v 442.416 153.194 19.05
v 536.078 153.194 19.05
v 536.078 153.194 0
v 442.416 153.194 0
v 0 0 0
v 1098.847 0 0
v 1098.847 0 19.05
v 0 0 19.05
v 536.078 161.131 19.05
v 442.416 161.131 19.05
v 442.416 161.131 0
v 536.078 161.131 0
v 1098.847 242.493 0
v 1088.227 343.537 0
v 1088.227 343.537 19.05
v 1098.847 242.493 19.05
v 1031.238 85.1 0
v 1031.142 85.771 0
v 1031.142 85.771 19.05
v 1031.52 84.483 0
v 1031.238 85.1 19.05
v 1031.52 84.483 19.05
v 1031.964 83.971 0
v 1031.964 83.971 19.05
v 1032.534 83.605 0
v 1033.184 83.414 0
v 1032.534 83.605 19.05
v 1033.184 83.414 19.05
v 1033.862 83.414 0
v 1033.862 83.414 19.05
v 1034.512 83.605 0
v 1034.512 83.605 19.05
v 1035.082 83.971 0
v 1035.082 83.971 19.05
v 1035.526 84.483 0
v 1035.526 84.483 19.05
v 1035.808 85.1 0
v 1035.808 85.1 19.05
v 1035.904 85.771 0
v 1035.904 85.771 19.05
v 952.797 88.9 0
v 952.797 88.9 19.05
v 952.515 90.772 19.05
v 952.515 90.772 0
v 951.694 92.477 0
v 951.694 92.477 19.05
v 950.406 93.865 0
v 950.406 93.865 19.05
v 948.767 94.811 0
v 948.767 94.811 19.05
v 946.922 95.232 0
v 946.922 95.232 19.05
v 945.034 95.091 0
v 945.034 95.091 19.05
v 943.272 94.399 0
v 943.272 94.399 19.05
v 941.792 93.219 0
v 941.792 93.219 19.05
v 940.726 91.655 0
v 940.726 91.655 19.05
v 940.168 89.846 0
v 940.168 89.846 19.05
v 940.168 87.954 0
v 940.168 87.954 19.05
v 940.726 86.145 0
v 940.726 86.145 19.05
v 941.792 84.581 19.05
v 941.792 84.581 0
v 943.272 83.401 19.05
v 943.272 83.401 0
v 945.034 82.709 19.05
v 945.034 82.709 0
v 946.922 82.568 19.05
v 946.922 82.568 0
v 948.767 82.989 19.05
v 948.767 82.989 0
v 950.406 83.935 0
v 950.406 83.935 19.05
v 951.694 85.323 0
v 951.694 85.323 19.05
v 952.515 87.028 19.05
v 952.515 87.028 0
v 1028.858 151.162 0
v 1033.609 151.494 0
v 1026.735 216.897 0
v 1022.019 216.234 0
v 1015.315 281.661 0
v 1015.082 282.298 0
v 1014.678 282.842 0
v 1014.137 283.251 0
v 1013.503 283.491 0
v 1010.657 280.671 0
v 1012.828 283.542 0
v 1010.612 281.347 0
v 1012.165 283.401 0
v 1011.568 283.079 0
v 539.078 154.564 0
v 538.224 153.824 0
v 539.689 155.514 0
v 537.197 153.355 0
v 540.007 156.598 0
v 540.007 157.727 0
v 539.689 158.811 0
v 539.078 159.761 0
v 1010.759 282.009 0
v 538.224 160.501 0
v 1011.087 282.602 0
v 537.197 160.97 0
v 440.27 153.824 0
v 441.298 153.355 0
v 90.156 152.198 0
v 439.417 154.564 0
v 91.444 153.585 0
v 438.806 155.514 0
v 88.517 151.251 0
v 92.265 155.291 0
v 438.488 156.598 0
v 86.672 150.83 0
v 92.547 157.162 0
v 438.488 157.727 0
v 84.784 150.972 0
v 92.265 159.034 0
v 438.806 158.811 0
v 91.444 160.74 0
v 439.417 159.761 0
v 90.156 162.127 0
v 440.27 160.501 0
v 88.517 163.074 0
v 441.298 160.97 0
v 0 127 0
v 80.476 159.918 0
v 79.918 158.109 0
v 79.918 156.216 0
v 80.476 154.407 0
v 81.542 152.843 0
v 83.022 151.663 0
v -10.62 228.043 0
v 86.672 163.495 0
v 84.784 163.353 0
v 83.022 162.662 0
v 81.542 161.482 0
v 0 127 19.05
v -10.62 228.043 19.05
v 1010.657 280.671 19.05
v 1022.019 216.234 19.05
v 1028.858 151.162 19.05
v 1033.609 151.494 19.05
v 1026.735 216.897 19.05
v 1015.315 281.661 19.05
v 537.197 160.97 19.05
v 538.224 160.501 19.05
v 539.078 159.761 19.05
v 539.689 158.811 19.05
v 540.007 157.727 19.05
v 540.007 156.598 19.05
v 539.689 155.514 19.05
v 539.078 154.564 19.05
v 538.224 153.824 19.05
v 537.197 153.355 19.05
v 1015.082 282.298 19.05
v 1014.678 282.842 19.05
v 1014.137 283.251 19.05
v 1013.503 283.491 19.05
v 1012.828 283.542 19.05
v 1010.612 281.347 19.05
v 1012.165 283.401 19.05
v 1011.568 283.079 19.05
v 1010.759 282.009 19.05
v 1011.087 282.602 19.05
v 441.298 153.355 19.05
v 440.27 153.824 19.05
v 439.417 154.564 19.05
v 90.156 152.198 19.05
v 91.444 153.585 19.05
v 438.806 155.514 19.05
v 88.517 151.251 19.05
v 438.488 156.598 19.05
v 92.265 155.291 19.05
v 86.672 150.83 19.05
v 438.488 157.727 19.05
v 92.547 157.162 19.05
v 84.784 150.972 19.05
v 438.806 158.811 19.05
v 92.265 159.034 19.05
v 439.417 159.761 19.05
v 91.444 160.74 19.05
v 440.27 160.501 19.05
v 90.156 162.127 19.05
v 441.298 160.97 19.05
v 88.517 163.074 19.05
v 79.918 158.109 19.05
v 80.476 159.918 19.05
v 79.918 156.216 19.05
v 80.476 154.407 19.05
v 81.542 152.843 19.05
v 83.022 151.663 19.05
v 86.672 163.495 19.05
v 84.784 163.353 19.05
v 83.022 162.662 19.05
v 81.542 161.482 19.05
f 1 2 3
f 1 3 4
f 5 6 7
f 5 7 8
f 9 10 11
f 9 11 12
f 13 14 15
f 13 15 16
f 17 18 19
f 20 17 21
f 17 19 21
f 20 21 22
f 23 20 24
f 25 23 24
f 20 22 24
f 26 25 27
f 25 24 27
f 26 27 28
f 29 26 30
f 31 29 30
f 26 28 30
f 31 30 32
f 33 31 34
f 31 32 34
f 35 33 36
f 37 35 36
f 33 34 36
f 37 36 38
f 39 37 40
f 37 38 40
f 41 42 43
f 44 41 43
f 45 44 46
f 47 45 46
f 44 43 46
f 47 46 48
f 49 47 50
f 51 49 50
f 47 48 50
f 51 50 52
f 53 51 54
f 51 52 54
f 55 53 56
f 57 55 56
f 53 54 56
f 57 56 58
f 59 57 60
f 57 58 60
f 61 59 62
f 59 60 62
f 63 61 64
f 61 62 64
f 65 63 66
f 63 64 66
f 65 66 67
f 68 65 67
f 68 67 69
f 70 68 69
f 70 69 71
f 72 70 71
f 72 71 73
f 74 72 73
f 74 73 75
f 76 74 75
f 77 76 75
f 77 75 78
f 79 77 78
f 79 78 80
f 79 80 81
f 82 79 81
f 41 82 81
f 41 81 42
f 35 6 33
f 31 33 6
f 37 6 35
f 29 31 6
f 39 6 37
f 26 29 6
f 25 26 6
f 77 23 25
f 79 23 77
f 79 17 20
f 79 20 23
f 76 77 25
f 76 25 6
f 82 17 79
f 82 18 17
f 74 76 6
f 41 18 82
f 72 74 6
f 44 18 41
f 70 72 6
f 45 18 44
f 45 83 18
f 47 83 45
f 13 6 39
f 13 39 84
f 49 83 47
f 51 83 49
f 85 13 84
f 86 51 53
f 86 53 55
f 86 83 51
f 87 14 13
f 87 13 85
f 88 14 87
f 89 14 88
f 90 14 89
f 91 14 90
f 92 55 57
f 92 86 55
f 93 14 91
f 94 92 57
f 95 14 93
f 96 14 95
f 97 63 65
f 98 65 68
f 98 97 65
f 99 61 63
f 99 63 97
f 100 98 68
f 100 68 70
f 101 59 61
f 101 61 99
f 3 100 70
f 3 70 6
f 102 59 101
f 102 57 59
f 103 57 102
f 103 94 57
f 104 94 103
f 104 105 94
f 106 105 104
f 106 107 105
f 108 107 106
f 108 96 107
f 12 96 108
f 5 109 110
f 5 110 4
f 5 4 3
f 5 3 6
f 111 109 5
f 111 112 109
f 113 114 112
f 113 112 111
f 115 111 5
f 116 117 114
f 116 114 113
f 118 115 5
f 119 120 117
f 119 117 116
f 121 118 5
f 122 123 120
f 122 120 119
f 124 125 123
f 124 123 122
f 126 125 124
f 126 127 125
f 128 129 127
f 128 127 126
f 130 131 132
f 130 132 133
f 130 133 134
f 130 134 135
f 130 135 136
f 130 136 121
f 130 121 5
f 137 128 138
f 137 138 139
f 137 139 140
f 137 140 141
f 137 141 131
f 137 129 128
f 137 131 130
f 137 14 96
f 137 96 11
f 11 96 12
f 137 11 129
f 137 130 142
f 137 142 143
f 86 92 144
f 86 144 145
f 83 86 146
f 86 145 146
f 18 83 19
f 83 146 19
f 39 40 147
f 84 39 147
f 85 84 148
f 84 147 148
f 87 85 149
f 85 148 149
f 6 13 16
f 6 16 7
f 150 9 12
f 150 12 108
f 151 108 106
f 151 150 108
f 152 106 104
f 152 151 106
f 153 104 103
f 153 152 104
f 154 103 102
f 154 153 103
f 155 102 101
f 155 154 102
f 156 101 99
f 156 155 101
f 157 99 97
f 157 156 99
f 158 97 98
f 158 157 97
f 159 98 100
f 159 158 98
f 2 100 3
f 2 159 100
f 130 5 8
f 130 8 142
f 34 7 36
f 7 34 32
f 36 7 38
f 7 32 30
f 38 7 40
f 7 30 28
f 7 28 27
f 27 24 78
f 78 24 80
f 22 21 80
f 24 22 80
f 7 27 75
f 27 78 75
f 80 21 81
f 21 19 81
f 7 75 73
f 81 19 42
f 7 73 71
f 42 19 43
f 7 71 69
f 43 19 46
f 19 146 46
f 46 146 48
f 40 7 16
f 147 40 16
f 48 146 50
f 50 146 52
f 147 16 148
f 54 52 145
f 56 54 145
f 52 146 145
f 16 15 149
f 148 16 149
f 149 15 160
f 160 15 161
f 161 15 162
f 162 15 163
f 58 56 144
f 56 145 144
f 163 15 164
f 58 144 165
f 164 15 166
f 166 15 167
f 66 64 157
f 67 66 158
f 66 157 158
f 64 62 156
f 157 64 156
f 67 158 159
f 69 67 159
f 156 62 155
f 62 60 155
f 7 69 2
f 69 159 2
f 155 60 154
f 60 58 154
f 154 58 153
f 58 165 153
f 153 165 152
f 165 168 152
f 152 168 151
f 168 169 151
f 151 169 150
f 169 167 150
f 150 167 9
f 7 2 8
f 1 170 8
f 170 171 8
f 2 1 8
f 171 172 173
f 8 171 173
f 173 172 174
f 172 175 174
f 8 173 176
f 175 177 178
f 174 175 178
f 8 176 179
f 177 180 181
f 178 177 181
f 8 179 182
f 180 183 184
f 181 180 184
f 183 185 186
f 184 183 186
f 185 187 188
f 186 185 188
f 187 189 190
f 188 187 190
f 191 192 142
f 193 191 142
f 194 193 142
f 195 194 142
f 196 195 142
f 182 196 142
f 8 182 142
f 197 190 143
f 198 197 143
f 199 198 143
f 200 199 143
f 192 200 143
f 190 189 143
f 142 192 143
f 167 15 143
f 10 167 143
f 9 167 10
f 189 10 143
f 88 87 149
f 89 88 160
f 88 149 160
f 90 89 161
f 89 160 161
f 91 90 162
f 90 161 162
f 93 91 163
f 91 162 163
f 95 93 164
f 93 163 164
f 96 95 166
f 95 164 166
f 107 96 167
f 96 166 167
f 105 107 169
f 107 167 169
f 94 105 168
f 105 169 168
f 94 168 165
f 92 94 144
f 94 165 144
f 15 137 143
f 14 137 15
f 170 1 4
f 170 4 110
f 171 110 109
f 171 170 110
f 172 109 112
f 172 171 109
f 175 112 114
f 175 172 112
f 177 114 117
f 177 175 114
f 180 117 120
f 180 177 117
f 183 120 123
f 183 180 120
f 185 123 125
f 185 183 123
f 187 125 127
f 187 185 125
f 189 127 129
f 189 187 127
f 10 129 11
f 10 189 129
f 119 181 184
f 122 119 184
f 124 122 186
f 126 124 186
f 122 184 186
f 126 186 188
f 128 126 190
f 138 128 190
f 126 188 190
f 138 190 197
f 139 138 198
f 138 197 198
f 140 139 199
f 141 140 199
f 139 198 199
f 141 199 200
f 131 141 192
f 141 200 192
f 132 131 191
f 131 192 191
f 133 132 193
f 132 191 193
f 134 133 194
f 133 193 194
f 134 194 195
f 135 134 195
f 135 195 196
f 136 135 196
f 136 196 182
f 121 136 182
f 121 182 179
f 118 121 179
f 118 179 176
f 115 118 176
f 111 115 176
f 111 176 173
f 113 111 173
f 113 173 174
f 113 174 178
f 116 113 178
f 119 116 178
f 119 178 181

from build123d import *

# Parameters (mm, degrees)
BOSS_EXTRUDE1_DEPTH = 19.05
SKETCH8_R           = 6.35
CUT_EXTRUDE3_DEPTH  = 1152.453768969
CUT_EXTRUDE4_DEPTH  = 1152.453768969
SKETCH10_R          = 6.35
CUT_EXTRUDE5_DEPTH  = 1152.453768969


with BuildPart() as part:
    # Sketch1 → Boss-Extrude1 (new body)
    with BuildSketch(Plane.XY):
        Polygon((-10.620091868, 228.043424569), (1088.227150324, 343.536923634), (1098.847242192, 242.493499064), (1098.847242192, 0), (0, 0), (0, 127), align=None)
    extrude(amount=BOSS_EXTRUDE1_DEPTH)

    # Sketch8 → Cut-Extrude3 (cut, through all)
    with BuildSketch(Plane.XY.offset(19.05)):
        with Locations((86.197214357, 157.1625)):
            Circle(SKETCH8_R)
        with BuildLine():
            Line((442.415992192, 161.13125), (536.078492192, 161.13125))
            ThreePointArc((536.078492192, 161.13125), (540.047242192, 157.1625), (536.078492192, 153.19375))
            Line((536.078492192, 153.19375), (442.415992192, 153.19375))
            ThreePointArc((442.415992192, 153.19375), (438.447242192, 157.1625), (442.415992192, 161.13125))
        make_face()
    extrude(amount=-CUT_EXTRUDE3_DEPTH, mode=Mode.SUBTRACT)

    # Sketch9 → Cut-Extrude4 (cut, through all)
    with BuildSketch(Plane.XY.offset(19.05)):
        with BuildLine():
            ThreePointArc((1035.904292432, 85.7708681), (1030.742924963, 184.255626282), (1015.315371576, 281.661364844))
            ThreePointArc((1015.315371576, 281.661364844), (1012.491067888, 283.495489105), (1010.656943627, 280.671185417))
            ThreePointArc((1010.656943627, 280.671185417), (1026.006514436, 183.757809476), (1031.141792432, 85.7708681))
            ThreePointArc((1031.141792432, 85.7708681), (1033.523042432, 83.3896181), (1035.904292432, 85.7708681))
        make_face()
    extrude(amount=-CUT_EXTRUDE4_DEPTH, mode=Mode.SUBTRACT)

    # Sketch10 → Cut-Extrude5 (cut, through all)
    with BuildSketch(Plane.XY.offset(19.05)):
        with Locations((946.447242192, 88.9)):
            Circle(SKETCH10_R)
    extrude(amount=-CUT_EXTRUDE5_DEPTH, mode=Mode.SUBTRACT)


solid = part.part
